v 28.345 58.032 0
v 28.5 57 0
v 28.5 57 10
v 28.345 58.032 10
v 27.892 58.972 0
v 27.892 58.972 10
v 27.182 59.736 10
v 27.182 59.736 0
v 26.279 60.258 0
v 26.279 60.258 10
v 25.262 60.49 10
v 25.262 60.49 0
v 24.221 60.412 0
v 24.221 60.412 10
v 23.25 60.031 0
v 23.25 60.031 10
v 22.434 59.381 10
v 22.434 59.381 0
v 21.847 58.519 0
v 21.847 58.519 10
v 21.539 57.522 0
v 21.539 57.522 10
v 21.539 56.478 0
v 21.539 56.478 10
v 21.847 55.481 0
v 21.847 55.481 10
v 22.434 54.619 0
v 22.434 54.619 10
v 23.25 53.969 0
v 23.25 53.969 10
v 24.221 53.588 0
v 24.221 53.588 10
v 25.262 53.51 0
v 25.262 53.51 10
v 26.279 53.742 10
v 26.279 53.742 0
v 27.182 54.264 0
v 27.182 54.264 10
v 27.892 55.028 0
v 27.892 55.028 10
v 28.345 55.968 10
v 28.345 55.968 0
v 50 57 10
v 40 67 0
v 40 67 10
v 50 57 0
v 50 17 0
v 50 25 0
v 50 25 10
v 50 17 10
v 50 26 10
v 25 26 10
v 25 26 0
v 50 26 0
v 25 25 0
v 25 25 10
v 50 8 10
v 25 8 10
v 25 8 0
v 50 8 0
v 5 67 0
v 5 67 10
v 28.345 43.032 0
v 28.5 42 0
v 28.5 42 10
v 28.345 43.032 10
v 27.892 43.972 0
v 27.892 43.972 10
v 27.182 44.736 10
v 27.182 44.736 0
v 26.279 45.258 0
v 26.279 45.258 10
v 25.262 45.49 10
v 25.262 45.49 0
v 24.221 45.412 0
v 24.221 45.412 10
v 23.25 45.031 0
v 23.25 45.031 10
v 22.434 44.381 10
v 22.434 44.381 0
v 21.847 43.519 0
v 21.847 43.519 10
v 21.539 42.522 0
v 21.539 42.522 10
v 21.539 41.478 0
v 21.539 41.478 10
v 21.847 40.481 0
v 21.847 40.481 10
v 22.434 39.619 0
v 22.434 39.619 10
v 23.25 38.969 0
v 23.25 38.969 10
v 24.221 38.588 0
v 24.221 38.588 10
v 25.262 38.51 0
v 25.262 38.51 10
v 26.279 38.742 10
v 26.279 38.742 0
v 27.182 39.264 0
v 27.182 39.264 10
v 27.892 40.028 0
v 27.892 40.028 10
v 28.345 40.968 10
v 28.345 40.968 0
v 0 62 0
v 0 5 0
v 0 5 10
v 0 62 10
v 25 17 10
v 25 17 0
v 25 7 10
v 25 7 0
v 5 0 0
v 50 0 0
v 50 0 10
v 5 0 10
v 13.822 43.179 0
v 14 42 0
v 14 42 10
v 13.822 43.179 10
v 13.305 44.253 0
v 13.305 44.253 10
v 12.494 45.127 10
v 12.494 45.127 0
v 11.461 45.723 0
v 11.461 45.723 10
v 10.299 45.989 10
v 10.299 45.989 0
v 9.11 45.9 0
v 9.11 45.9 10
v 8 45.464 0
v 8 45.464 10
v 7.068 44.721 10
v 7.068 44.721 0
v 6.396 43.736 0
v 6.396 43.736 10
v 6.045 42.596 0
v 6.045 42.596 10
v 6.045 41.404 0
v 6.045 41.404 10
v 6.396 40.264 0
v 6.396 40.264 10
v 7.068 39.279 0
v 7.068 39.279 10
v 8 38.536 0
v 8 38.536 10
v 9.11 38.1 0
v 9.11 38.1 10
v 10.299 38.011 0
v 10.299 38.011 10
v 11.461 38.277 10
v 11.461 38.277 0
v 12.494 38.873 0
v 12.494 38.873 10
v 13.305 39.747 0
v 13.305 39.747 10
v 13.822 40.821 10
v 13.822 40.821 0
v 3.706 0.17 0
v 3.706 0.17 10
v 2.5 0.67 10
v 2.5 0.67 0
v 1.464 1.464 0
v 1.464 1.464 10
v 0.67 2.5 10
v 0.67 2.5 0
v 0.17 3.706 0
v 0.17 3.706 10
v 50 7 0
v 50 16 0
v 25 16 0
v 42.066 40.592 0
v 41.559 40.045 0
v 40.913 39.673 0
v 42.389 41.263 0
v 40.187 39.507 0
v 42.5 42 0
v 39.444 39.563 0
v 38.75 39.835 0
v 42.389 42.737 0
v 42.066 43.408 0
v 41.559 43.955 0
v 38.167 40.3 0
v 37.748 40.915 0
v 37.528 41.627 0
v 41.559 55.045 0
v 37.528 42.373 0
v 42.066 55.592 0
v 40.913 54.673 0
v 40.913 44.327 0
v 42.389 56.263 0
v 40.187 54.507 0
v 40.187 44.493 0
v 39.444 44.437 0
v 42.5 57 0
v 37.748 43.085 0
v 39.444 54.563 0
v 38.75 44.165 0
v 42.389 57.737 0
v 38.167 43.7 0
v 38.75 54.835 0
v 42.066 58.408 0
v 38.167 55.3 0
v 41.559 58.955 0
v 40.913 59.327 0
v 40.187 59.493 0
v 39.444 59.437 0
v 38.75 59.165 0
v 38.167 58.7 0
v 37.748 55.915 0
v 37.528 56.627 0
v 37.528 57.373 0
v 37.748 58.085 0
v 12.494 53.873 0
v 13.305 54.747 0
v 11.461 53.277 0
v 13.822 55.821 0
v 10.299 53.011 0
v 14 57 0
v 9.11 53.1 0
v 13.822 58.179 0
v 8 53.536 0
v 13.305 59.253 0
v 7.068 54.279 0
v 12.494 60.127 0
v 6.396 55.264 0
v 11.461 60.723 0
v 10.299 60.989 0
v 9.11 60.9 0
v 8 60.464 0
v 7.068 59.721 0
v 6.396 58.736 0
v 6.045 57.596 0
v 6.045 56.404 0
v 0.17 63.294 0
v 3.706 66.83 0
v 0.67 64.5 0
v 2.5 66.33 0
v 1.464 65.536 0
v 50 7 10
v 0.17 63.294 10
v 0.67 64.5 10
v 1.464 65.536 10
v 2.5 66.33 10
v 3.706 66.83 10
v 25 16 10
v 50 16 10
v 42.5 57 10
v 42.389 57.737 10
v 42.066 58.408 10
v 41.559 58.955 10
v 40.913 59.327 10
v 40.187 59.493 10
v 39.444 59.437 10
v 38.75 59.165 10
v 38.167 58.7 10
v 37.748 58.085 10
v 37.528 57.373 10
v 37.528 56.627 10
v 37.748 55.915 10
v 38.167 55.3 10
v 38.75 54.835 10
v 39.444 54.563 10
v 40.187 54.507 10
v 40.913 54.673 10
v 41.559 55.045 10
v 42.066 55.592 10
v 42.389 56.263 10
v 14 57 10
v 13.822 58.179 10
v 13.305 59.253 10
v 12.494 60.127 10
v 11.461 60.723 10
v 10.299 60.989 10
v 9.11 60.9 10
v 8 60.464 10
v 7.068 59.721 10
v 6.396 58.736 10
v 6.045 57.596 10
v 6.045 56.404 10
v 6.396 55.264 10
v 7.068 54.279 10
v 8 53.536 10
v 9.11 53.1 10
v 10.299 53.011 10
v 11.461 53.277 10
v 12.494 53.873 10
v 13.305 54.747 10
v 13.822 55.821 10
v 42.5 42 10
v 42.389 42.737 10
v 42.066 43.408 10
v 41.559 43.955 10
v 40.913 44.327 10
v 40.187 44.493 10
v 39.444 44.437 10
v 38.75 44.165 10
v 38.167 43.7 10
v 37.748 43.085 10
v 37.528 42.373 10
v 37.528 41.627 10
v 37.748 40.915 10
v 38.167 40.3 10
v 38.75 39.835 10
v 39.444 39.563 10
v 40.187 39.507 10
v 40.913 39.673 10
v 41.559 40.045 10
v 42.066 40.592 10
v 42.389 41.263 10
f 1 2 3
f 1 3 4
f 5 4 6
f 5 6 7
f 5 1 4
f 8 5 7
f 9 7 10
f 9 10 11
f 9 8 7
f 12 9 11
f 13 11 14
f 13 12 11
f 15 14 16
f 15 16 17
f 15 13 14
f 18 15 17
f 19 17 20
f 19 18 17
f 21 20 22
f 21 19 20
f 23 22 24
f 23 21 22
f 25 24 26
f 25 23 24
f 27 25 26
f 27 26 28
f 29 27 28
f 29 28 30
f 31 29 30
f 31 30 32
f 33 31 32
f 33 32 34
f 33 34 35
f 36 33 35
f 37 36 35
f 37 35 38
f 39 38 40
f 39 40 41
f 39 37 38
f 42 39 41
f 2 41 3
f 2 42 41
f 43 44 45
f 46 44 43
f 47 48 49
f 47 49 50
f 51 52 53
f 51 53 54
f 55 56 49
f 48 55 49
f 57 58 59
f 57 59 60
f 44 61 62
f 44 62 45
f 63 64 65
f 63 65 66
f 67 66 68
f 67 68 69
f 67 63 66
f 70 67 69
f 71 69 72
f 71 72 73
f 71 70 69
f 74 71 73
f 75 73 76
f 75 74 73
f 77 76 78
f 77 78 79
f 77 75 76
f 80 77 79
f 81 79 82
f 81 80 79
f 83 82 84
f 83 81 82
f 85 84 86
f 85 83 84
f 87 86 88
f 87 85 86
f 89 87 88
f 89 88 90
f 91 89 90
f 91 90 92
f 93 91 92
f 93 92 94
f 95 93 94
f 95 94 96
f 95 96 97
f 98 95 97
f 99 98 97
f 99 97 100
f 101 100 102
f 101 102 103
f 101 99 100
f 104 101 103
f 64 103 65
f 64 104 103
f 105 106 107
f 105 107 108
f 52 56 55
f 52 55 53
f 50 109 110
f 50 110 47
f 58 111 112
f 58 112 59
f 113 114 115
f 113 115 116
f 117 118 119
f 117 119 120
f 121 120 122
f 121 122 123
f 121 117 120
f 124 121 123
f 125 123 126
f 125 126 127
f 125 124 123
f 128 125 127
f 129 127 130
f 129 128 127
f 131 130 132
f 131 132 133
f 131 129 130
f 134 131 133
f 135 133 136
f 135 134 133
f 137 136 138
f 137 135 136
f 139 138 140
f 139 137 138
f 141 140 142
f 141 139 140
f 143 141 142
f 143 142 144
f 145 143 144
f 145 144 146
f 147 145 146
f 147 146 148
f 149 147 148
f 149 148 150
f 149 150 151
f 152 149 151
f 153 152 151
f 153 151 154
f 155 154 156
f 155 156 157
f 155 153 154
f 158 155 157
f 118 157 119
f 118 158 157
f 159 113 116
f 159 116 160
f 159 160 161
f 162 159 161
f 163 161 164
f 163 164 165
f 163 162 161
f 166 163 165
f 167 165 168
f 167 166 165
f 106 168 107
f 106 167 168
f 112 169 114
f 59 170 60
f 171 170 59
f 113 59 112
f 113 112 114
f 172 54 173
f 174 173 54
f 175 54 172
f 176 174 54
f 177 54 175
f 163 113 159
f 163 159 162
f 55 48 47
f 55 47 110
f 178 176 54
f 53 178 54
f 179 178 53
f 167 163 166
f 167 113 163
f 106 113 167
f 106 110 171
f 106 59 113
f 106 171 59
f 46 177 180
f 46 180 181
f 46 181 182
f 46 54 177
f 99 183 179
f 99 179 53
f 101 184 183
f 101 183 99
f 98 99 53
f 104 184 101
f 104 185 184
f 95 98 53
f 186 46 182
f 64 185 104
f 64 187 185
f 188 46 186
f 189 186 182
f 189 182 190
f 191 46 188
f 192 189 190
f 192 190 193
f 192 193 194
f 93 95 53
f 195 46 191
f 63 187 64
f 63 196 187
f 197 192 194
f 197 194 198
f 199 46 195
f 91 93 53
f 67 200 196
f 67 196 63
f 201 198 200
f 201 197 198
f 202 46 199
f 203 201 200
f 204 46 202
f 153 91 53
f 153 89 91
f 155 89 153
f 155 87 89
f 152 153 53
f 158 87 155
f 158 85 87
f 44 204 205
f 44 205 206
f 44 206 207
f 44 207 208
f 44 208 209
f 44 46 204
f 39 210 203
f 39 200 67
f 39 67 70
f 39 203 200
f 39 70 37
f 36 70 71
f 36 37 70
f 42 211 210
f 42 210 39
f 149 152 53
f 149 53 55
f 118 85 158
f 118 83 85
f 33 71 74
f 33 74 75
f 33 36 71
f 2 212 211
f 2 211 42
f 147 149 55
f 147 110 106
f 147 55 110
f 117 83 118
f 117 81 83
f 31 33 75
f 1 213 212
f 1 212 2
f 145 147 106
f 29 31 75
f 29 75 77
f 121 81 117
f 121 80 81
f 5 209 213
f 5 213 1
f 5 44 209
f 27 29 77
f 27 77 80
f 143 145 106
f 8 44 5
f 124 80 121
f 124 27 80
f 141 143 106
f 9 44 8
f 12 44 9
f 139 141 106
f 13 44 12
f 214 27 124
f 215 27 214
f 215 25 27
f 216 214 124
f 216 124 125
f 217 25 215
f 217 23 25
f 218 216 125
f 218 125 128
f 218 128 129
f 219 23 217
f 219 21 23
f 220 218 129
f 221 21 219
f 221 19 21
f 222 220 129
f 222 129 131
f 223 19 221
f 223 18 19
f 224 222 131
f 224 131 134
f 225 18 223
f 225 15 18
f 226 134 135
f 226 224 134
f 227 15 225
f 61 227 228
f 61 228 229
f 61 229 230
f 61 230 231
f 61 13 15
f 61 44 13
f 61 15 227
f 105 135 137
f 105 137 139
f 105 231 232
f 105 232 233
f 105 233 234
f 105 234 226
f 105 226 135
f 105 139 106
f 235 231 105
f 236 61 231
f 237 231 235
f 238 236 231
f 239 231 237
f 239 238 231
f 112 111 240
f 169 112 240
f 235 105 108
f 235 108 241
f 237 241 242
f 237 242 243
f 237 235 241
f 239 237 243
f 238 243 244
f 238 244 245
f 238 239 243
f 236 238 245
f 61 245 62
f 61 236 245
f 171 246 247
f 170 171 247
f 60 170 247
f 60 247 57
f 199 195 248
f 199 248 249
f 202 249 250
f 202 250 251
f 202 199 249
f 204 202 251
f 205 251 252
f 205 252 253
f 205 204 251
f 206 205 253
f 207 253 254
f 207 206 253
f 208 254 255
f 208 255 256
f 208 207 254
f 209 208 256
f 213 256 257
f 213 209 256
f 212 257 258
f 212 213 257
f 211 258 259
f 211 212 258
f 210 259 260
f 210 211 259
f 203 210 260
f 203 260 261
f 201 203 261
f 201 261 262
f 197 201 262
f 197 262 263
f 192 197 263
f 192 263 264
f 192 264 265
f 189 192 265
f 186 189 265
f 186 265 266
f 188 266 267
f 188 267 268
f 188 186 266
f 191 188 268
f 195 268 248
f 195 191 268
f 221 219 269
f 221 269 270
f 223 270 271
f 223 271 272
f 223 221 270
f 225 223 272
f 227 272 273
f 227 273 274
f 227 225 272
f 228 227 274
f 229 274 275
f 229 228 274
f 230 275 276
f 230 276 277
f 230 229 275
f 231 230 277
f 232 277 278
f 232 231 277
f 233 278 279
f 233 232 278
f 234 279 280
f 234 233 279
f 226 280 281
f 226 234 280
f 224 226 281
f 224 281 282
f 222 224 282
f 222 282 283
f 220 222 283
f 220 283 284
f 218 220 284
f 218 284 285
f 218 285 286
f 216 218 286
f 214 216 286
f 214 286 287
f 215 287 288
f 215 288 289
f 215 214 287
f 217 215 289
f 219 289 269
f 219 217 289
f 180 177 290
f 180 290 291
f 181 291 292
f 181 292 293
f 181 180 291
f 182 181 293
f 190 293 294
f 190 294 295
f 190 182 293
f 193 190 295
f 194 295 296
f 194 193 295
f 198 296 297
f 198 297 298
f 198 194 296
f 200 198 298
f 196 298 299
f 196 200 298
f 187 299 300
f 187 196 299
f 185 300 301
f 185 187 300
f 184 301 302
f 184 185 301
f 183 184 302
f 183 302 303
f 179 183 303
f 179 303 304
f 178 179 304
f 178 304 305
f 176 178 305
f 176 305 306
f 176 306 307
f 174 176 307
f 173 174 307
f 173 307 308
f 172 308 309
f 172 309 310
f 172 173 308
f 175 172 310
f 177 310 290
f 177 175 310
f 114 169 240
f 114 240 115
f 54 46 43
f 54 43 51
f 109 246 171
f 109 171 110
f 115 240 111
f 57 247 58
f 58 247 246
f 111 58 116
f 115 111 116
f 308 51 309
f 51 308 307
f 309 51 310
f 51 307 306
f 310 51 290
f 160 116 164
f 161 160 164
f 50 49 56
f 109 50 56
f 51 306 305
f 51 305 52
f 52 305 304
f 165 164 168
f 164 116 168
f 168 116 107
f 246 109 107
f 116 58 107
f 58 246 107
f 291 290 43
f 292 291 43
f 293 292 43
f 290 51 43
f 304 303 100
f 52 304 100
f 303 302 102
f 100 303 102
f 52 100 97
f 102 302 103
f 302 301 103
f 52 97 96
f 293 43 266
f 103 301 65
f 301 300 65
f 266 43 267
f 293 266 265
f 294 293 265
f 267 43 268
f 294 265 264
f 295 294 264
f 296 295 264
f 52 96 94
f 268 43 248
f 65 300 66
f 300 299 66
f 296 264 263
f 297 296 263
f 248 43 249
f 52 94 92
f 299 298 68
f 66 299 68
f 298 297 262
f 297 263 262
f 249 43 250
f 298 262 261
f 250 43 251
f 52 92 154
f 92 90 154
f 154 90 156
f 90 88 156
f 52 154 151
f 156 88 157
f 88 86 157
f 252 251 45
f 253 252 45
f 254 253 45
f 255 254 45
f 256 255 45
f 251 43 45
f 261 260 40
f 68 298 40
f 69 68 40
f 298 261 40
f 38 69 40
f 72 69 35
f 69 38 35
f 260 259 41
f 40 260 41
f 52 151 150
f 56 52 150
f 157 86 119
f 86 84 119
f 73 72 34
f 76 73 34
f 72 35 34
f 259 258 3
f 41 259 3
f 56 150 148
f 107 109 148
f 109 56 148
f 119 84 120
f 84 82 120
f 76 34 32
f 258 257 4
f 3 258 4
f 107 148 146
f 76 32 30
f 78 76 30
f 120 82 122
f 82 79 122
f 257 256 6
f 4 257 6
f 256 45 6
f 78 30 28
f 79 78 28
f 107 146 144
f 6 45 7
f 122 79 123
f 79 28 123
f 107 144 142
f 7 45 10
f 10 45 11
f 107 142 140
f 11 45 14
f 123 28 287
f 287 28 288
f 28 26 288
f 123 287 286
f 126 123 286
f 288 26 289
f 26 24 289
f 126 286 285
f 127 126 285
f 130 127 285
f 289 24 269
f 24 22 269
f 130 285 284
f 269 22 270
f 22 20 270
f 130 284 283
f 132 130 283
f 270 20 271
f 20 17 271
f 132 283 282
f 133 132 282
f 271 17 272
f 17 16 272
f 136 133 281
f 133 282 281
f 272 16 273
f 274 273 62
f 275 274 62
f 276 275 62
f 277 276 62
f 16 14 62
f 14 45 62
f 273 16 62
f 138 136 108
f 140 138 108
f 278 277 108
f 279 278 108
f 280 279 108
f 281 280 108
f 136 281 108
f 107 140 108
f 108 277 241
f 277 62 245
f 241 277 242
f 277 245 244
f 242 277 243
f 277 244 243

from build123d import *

# Parameters (mm, degrees)
SKETCH1_R           = 4
SKETCH1_R_2         = 3.5
SKETCH1_R_3         = 2.5
BOSS_EXTRUDE1_DEPTH = 10
SKETCH2_W           = 25
SKETCH2_H           = 1
CUT_EXTRUDE1_DEPTH  = 10


with BuildPart() as part:
    # Sketch1 → Boss-Extrude1 (new body)
    with BuildSketch(Plane.XY):
        with BuildLine():
            Line((40, 67), (50, 57))
            Line((50, 57), (50, 0))
            Line((50, 0), (5, 0))
            ThreePointArc((5, 0), (1.464466094, 1.464466094), (0, 5))
            Line((0, 5), (0, 62))
            ThreePointArc((0, 62), (1.464466094, 65.535533906), (5, 67))
            Line((5, 67), (40, 67))
        make_face()
        with Locations((10, 57)):
            Circle(SKETCH1_R, mode=Mode.SUBTRACT)
        with Locations((25, 57)):
            Circle(SKETCH1_R_2, mode=Mode.SUBTRACT)
        with Locations((40, 57)):
            Circle(SKETCH1_R_3, mode=Mode.SUBTRACT)
        with Locations((10, 42)):
            Circle(SKETCH1_R, mode=Mode.SUBTRACT)
        with Locations((25, 42)):
            Circle(SKETCH1_R_2, mode=Mode.SUBTRACT)
        with Locations((40, 42)):
            Circle(SKETCH1_R_3, mode=Mode.SUBTRACT)
    extrude(amount=BOSS_EXTRUDE1_DEPTH)

    # Sketch2 → Cut-Extrude1 (cut)
    with BuildSketch(Plane.XY.offset(10)):
        with Locations((37.5, 25.5)):
            Rectangle(SKETCH2_W, SKETCH2_H)
        with Locations((37.5, 16.5)):
            Rectangle(SKETCH2_W, SKETCH2_H)
        with Locations((37.5, 7.5)):
            Rectangle(SKETCH2_W, SKETCH2_H)
    extrude(amount=-CUT_EXTRUDE1_DEPTH, mode=Mode.SUBTRACT)


solid = part.part
